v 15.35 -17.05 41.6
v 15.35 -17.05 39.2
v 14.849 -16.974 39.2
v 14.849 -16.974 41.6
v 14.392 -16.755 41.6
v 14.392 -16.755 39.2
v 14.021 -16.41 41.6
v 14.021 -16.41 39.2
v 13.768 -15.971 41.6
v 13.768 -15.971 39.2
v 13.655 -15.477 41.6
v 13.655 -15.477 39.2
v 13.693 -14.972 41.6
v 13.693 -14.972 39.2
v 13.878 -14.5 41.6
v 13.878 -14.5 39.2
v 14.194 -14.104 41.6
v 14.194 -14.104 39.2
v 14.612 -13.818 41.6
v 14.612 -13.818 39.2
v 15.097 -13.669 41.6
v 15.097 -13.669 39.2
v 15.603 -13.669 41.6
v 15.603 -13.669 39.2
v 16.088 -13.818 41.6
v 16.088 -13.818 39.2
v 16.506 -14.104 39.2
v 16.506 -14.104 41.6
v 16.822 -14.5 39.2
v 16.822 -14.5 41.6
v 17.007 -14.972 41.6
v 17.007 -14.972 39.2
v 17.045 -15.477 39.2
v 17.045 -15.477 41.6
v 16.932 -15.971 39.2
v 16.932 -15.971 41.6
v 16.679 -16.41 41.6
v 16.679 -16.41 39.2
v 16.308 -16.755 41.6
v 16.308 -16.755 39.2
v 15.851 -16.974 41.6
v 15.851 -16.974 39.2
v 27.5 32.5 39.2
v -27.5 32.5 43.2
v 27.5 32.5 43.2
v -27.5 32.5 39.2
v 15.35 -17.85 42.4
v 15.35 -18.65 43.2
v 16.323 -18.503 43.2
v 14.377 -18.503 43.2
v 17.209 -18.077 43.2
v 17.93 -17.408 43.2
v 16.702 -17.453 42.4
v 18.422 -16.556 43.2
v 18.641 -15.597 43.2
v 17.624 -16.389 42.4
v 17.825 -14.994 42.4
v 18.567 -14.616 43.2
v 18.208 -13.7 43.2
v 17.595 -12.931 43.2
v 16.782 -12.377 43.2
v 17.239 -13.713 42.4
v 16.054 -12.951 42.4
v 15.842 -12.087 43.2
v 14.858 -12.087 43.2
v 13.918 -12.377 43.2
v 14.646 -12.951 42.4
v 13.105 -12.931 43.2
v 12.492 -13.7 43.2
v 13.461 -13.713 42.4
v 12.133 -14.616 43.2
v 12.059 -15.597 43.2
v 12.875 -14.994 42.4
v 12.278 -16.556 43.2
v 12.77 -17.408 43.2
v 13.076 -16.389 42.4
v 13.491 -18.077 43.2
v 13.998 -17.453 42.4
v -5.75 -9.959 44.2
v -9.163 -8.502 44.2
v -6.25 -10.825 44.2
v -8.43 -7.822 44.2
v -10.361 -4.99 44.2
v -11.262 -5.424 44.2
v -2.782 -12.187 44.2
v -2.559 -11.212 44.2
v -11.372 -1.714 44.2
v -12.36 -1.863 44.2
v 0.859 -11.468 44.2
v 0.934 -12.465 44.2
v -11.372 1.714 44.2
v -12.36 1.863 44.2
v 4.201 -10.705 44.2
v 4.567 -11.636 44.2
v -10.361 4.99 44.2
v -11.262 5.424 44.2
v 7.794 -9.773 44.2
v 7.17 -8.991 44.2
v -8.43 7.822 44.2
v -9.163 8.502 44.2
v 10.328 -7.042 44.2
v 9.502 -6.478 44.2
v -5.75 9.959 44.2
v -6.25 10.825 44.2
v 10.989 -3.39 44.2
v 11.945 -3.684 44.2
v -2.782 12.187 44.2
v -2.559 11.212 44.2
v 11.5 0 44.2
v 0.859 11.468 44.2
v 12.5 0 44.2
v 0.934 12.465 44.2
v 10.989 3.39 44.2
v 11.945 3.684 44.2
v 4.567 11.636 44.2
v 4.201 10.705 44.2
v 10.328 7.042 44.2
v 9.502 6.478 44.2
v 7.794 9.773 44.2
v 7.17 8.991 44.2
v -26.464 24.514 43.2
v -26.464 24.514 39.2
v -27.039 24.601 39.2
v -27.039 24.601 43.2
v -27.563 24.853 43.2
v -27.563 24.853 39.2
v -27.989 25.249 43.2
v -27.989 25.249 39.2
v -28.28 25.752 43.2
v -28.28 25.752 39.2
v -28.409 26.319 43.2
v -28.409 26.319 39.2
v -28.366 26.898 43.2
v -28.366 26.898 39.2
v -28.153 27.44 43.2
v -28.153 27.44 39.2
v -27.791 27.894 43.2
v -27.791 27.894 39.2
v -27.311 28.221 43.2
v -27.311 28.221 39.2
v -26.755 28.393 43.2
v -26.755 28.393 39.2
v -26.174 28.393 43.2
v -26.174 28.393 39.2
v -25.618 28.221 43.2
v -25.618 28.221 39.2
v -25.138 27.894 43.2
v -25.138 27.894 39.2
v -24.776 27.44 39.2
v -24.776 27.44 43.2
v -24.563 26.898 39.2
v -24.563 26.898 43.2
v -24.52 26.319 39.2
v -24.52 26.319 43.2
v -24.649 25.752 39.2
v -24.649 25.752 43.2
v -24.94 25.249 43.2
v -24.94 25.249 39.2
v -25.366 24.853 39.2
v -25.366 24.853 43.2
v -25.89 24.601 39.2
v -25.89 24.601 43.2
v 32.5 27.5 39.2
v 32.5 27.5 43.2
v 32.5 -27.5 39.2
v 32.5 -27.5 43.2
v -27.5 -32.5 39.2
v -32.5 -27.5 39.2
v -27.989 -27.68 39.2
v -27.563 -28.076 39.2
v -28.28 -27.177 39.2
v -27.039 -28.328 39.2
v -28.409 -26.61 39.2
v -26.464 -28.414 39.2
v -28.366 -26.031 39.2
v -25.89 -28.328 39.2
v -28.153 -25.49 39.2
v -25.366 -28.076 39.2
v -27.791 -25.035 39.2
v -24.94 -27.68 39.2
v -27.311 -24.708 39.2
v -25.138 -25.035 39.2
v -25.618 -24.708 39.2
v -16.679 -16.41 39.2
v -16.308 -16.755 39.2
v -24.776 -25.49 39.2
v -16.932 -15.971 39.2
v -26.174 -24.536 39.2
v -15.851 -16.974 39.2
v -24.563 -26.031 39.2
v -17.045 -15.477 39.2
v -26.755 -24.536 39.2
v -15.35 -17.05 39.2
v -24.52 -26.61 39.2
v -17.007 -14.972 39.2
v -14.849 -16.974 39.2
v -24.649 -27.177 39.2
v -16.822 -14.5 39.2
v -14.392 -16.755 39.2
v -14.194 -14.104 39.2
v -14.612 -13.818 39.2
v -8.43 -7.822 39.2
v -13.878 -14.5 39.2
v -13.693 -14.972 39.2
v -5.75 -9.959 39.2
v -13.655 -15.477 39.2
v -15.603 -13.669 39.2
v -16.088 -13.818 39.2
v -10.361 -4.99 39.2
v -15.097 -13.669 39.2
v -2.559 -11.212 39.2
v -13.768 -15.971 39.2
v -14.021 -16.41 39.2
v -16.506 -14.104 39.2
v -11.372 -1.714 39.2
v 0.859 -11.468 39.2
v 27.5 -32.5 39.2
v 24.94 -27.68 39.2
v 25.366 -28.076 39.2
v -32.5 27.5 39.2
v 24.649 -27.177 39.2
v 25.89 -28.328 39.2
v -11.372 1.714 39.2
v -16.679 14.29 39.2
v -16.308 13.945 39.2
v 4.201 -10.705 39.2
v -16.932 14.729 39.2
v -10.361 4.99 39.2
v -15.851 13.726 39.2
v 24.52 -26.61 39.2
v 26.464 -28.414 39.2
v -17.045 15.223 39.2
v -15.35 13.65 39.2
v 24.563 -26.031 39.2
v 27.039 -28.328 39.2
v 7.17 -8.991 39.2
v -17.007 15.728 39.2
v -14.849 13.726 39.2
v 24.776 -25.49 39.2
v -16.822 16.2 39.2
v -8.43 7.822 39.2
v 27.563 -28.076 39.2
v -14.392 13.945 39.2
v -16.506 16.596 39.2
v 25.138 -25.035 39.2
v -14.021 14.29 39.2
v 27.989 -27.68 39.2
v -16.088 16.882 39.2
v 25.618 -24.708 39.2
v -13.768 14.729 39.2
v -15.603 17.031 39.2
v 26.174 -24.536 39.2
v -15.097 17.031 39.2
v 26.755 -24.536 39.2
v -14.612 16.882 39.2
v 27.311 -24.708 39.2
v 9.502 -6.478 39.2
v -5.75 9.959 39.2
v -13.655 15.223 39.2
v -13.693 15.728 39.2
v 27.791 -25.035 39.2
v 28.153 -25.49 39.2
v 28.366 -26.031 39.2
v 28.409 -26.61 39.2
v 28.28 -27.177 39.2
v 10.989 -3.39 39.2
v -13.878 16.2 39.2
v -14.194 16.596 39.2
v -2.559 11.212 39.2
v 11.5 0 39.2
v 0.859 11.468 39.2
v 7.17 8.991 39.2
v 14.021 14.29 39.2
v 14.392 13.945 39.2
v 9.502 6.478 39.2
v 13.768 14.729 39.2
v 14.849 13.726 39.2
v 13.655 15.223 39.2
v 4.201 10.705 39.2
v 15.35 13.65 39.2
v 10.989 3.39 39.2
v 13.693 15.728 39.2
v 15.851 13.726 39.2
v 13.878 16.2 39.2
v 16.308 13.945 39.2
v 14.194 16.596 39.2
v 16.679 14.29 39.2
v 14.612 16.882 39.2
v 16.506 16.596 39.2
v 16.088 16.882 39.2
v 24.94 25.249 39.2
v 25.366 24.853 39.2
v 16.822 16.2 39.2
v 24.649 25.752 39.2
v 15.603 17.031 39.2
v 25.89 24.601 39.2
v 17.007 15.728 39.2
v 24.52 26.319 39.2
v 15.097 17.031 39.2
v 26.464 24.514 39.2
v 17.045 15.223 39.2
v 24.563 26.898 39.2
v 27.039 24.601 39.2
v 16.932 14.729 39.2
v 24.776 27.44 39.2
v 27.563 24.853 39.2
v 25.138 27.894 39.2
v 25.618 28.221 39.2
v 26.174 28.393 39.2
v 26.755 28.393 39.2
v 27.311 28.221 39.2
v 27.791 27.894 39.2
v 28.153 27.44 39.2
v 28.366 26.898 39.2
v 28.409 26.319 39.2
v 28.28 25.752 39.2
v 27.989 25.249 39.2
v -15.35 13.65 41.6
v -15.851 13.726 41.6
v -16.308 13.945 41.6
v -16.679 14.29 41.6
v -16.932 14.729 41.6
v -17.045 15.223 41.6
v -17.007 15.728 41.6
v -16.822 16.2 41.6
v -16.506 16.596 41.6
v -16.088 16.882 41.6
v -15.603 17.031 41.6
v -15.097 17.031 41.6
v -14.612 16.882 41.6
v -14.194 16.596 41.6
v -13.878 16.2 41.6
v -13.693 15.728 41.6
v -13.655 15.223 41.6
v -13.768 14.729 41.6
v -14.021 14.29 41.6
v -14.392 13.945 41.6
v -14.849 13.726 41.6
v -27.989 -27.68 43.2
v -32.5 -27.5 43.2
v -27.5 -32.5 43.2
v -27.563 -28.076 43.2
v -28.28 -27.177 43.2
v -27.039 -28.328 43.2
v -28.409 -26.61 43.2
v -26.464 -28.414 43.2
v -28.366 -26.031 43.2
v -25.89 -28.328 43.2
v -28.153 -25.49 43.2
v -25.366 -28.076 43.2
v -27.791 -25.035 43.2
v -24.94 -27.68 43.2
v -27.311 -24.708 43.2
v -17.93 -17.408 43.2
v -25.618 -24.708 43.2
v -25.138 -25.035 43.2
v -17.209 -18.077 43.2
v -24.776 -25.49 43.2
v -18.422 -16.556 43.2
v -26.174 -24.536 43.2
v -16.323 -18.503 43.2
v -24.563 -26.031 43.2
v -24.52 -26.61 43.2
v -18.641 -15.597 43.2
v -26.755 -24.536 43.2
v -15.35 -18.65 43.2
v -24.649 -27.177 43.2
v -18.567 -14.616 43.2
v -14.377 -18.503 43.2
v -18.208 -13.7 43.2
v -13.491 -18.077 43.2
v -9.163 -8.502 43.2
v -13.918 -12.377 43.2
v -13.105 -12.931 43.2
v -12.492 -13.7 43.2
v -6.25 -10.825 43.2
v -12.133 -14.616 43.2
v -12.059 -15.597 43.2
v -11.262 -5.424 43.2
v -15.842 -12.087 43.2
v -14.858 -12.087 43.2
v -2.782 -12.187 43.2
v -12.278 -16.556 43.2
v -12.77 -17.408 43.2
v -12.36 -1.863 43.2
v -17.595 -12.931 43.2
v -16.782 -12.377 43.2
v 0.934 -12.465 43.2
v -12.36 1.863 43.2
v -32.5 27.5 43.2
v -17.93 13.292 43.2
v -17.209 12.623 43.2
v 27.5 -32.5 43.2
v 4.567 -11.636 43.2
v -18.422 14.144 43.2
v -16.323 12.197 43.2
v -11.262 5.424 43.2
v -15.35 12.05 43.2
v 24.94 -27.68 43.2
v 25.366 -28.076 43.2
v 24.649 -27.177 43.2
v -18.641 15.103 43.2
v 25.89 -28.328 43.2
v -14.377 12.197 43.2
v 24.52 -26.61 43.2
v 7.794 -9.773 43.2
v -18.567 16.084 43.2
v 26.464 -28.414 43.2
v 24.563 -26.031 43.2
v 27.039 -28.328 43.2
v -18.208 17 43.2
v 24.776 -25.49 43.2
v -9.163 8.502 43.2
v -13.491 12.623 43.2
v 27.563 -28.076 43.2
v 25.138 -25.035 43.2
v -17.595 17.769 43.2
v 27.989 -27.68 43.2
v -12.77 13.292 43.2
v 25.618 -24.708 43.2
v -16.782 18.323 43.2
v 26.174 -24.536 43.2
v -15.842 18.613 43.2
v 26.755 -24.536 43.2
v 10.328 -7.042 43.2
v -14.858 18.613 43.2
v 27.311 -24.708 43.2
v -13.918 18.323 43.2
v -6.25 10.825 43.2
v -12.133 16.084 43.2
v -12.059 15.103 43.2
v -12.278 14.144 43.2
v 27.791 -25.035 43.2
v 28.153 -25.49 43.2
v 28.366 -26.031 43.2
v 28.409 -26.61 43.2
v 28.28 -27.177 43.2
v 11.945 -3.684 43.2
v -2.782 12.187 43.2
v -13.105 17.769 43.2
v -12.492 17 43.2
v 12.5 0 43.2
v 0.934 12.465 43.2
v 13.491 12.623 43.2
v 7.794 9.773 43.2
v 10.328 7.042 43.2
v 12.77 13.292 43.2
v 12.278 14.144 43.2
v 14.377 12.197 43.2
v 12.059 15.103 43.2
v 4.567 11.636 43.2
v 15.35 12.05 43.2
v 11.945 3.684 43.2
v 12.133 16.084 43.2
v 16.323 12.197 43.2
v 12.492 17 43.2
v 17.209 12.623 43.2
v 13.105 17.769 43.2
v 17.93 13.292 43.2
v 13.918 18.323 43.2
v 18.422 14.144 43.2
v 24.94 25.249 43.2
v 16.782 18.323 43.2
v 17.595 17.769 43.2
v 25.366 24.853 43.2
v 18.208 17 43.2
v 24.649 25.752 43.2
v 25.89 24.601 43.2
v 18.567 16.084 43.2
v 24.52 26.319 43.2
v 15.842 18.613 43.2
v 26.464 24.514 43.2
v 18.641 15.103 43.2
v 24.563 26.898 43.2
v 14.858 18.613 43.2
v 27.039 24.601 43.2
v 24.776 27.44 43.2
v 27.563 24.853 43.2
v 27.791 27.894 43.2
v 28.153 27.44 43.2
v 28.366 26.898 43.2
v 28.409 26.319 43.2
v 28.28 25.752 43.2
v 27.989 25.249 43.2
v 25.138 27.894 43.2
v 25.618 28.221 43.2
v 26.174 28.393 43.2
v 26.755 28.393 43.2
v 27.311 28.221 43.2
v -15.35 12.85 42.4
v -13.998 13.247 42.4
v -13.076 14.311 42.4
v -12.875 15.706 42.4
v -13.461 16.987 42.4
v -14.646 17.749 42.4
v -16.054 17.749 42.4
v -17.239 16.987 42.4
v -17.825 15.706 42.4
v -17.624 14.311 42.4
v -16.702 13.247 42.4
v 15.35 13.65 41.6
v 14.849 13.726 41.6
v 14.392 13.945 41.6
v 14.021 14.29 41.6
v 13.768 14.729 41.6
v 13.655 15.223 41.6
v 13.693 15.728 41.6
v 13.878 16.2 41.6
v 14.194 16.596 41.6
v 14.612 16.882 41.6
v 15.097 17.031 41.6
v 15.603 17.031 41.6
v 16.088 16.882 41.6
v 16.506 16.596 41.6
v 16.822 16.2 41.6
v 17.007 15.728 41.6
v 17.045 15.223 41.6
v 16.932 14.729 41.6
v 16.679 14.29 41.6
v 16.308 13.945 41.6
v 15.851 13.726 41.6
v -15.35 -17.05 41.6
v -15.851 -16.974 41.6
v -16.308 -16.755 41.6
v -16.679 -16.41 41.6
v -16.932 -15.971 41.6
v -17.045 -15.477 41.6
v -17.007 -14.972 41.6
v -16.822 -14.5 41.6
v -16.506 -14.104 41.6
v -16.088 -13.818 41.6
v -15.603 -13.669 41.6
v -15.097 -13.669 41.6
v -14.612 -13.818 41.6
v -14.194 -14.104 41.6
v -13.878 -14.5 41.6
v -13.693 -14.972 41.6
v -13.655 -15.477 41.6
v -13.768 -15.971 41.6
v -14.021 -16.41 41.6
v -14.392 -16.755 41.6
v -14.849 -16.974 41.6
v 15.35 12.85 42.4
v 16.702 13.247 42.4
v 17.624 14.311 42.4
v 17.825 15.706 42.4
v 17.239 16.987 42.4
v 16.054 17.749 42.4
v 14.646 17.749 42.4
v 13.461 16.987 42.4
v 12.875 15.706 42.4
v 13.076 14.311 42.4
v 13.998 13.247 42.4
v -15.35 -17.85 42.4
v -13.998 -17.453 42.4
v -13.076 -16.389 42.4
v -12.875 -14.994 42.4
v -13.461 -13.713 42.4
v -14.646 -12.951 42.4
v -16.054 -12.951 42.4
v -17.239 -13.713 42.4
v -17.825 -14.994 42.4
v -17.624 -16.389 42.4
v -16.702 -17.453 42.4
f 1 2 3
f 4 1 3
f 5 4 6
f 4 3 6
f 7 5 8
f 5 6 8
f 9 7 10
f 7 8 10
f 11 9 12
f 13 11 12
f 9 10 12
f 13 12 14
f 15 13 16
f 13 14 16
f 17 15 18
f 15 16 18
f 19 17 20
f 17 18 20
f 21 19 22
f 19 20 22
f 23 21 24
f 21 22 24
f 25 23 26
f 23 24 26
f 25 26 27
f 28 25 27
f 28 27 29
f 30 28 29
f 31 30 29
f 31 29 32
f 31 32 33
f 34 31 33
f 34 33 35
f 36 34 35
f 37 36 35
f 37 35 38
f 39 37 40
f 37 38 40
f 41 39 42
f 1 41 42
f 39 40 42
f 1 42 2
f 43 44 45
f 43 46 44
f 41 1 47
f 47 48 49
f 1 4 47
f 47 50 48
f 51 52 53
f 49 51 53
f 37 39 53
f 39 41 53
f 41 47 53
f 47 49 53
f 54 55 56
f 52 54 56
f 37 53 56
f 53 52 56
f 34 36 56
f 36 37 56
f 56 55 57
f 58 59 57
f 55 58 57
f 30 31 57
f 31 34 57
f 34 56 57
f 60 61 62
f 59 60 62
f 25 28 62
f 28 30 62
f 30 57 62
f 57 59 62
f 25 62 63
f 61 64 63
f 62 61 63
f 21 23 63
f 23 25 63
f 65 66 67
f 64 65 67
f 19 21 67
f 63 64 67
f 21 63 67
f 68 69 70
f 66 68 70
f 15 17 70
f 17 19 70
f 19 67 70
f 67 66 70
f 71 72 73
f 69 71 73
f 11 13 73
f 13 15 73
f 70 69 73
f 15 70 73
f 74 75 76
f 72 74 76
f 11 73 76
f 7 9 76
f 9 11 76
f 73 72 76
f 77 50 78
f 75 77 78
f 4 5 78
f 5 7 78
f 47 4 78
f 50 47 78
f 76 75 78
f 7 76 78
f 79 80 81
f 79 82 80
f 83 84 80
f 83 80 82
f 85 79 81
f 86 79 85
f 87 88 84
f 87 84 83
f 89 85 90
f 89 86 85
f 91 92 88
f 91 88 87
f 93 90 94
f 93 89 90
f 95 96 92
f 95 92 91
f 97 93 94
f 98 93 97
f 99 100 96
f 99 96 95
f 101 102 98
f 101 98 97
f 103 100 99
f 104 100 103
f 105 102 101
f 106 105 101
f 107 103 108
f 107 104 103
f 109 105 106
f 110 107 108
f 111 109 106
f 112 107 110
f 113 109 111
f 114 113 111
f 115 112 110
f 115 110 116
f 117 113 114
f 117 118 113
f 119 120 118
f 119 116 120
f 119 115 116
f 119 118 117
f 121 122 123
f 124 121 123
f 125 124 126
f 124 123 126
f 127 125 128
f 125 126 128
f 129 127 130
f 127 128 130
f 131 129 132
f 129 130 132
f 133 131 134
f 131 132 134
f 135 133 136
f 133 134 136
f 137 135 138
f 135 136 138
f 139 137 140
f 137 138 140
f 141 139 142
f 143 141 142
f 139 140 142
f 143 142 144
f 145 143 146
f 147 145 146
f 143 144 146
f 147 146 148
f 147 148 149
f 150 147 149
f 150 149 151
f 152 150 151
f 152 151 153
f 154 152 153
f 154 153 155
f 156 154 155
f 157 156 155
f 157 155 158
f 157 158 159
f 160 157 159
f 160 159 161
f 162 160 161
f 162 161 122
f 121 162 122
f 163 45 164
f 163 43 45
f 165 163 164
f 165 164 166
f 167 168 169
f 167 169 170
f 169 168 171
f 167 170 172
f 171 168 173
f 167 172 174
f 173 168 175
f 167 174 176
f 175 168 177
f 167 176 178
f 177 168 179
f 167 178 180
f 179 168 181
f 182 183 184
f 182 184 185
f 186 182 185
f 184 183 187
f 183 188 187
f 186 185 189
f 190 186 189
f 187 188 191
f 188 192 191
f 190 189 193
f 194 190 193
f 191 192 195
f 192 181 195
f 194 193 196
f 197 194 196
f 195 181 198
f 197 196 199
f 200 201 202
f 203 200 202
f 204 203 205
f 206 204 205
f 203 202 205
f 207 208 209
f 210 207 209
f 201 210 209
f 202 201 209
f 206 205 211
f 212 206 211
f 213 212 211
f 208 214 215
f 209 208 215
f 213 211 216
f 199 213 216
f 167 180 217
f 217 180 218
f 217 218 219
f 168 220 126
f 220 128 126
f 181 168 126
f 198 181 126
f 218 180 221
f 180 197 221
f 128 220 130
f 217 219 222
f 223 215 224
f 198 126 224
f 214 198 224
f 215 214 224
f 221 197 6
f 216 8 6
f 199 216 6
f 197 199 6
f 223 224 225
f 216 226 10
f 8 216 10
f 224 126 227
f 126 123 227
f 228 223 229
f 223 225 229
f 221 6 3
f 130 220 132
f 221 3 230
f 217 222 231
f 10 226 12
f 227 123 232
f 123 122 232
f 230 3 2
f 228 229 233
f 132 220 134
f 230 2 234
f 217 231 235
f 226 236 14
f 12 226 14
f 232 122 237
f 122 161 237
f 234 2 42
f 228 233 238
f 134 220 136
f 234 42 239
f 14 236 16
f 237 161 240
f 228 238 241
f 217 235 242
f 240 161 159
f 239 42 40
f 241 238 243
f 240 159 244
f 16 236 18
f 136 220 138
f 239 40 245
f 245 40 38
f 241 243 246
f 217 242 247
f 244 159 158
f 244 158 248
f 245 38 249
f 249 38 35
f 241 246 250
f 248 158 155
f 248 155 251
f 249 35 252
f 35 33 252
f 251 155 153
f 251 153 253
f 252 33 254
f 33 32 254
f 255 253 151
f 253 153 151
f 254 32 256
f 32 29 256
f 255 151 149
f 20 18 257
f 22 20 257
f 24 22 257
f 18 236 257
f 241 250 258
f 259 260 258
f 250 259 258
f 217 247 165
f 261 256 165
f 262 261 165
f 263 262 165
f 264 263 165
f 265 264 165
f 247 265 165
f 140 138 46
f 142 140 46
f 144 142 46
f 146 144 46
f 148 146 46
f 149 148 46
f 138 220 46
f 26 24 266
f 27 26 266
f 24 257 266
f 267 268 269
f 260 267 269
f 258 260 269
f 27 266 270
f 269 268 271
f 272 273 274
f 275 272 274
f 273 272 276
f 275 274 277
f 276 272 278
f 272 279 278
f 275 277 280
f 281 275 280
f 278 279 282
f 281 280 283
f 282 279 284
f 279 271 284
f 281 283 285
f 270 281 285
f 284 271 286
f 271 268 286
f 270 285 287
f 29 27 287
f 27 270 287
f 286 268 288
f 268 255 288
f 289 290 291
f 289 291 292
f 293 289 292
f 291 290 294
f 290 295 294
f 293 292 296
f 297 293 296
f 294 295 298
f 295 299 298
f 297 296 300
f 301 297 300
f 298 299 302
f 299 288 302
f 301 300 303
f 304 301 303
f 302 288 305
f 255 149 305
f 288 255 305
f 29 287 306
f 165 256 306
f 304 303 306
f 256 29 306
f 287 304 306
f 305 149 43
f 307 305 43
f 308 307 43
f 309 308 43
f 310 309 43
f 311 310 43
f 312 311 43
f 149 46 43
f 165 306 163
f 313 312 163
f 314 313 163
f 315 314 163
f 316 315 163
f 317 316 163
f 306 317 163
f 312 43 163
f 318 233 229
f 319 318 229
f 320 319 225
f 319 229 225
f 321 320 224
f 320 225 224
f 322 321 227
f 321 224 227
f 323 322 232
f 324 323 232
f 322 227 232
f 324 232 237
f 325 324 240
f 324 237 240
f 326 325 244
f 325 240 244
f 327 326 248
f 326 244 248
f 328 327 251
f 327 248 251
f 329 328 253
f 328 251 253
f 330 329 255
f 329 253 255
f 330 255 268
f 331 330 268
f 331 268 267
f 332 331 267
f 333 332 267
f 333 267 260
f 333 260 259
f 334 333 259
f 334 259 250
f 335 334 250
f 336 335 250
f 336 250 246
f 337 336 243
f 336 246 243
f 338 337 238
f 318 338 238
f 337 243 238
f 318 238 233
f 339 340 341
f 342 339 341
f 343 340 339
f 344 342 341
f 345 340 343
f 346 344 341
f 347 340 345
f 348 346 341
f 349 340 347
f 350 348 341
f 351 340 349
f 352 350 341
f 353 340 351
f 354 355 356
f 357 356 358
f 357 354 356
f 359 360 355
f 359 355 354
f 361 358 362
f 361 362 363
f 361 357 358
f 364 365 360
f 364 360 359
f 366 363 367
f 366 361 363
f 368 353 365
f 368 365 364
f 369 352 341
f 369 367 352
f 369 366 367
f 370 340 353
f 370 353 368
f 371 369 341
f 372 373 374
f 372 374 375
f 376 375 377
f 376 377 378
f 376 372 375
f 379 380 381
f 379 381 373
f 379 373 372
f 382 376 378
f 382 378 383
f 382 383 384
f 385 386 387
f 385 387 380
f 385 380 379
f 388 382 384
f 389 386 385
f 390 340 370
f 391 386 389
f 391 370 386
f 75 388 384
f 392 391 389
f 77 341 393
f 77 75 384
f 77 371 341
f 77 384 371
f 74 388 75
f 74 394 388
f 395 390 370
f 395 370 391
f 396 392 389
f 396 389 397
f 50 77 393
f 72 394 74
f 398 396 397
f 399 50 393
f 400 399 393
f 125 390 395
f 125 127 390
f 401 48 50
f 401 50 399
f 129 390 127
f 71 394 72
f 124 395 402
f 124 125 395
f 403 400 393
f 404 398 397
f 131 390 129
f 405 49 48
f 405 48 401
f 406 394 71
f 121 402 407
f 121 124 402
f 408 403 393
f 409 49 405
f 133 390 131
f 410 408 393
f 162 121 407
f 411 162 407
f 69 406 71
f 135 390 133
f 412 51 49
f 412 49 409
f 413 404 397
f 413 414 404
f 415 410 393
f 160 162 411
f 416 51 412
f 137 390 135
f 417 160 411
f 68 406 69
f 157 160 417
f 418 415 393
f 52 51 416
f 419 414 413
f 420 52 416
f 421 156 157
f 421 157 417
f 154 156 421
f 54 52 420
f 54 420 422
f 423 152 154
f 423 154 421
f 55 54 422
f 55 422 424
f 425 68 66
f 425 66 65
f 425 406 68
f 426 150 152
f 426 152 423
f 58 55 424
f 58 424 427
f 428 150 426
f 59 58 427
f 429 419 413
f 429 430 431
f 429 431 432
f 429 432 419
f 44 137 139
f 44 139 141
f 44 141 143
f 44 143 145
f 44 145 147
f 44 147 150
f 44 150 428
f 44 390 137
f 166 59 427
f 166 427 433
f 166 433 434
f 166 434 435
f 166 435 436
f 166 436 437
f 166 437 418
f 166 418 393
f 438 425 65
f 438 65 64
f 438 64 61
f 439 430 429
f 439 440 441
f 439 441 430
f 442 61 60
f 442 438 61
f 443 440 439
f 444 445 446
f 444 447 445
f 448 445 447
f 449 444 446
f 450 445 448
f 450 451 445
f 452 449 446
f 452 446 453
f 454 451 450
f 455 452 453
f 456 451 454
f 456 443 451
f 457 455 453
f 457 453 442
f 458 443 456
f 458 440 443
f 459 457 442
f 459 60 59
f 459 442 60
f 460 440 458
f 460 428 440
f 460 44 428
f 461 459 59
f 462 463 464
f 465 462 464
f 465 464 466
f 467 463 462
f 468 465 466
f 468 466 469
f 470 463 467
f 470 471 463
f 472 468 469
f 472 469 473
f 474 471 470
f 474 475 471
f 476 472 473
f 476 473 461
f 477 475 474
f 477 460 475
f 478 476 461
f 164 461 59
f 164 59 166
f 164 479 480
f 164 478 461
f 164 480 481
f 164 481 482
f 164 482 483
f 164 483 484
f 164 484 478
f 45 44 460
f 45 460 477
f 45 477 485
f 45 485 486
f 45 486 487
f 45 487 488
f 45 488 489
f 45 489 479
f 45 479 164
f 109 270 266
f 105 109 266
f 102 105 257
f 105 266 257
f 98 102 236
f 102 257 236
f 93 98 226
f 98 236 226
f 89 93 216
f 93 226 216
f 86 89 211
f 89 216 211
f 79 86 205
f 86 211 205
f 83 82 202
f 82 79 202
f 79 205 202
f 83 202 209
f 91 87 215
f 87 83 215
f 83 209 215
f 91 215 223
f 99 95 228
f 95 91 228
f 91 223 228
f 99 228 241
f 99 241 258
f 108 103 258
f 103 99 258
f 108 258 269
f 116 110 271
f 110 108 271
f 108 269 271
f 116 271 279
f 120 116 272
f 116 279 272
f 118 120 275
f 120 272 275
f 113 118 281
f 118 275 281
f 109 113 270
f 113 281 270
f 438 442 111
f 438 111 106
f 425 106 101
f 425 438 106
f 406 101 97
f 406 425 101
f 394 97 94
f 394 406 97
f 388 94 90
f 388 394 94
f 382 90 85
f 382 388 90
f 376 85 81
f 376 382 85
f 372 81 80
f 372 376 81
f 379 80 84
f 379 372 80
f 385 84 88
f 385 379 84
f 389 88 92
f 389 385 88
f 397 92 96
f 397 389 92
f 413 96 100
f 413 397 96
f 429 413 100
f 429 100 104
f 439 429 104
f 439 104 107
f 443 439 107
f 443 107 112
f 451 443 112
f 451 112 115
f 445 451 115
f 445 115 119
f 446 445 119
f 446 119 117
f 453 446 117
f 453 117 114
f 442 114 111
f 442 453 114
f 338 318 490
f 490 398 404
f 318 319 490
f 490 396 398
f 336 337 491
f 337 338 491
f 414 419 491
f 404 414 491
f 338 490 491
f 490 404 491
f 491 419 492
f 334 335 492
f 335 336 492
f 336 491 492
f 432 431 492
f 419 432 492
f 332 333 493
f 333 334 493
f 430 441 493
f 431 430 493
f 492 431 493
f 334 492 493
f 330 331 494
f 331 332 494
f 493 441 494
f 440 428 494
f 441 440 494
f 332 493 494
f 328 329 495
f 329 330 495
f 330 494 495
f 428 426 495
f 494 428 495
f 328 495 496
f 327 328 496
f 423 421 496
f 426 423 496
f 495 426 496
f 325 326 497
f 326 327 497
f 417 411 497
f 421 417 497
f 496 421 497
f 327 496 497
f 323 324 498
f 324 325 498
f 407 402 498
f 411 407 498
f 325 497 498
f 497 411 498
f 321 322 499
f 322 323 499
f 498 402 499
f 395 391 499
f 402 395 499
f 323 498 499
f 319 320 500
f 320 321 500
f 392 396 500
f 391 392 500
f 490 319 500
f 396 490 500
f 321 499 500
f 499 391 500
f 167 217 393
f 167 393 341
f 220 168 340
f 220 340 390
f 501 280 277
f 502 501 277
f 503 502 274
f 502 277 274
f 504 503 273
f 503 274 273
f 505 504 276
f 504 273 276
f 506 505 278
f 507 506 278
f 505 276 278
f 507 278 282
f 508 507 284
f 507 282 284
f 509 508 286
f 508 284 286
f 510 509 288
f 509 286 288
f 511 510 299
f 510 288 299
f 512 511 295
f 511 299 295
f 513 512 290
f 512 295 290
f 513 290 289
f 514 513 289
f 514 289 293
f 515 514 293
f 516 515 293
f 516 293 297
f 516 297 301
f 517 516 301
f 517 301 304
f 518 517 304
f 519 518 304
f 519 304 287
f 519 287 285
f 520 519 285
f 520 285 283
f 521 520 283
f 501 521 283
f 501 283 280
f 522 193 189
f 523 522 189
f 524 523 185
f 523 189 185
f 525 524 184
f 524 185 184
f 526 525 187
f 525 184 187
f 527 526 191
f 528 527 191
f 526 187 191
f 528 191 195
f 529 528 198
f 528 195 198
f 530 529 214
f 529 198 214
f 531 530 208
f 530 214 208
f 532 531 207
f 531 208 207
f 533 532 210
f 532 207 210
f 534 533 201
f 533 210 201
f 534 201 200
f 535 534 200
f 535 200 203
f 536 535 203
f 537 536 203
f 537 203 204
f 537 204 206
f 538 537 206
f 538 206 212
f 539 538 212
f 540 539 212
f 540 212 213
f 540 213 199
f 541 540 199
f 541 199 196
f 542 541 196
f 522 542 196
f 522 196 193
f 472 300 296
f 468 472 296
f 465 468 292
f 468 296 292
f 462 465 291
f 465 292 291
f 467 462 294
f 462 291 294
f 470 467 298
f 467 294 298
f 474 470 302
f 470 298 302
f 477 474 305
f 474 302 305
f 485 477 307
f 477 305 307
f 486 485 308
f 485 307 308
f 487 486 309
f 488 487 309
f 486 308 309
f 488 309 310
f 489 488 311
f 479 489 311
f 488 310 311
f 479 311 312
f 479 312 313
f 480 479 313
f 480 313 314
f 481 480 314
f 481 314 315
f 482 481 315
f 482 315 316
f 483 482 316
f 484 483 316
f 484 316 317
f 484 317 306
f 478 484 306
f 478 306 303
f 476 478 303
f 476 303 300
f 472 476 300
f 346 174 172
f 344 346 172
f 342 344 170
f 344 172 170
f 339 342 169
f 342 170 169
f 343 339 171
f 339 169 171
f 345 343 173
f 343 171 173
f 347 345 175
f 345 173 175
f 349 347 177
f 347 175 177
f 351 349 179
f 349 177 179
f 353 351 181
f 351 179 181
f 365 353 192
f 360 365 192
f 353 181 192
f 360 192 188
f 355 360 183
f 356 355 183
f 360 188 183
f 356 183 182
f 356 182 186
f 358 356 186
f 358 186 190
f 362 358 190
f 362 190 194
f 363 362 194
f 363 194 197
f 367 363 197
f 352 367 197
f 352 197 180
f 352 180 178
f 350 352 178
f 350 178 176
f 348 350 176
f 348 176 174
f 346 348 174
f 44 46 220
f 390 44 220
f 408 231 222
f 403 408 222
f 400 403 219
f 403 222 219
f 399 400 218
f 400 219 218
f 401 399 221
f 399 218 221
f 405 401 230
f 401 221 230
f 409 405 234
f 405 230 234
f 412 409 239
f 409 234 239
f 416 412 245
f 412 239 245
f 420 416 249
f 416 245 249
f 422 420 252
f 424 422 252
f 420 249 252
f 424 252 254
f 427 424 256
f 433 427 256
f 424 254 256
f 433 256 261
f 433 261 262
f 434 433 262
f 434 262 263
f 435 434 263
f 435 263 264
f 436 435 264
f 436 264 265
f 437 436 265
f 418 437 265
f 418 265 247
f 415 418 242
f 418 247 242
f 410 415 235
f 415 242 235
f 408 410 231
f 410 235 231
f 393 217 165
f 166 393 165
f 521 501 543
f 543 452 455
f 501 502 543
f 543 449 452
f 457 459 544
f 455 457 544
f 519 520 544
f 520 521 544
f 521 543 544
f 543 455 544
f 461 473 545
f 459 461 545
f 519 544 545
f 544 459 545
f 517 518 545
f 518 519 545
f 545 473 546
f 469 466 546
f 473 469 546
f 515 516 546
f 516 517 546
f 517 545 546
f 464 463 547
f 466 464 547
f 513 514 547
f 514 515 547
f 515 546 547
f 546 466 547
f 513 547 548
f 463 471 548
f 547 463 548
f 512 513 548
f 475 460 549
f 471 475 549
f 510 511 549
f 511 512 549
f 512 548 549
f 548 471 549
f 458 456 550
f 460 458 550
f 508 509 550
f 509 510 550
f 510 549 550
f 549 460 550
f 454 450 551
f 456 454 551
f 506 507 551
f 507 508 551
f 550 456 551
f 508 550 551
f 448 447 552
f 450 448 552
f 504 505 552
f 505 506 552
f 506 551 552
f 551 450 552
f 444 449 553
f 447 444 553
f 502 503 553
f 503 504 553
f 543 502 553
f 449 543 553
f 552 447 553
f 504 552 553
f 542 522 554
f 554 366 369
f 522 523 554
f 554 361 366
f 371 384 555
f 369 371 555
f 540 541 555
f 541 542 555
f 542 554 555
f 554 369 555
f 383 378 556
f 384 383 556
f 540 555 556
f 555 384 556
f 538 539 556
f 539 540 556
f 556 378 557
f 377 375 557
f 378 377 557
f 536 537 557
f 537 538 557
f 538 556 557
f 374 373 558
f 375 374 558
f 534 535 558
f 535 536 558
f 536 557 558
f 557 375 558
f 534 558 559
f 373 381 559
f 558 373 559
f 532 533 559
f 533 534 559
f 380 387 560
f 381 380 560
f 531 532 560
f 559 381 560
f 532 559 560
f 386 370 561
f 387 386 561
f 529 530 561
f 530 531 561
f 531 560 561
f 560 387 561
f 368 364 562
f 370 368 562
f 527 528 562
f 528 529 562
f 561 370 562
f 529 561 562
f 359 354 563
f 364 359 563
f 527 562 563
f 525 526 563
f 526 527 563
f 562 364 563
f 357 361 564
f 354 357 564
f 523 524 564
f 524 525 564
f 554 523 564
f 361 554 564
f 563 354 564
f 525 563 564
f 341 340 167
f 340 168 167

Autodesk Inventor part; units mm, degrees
ref_plane "YZ Plane" through (0, 0, 0) normal (1, 0, 0) x (0, 1, 0)
ref_plane "XZ Plane" through (0, 0, 0) normal (0, 1, 0) x (-1, 0, 0)
ref_plane "РабПлоскость1" through (0, 0, 39.2) normal (0, 0, 1) x (1, 0, 0)
sketch "Эскиз1" plane through (0, 0, 39.2) normal (0, 0, 1) x (1, 0, 0)
  line L0 (27.5, -32.5) -> (-27.5, -32.5)
  line L1 (-32.5, -27.5) -> (-32.5, 27.5)
  line L2 (-27.5, 32.5) -> (27.5, 32.5)
  line L3 (32.5, 27.5) -> (32.5, -27.5)
  line L4 (32.5, -32.5) -> (-32.5, 32.5) construction
  line L5 (-32.5, -32.5) -> (32.5, 32.5) construction
  circle A0 centre (-15.35, 15.35) radius 1.75 construction
  circle A1 centre (15.35, 15.35) radius 1.75 construction
  arc A2 (14.0855, -15.35) -> (14.4559, -14.4559) centre (15.35, -15.35) ccw construction
  arc A3 (-16.6145, -15.35) -> (-16.2441, -14.4559) centre (-15.35, -15.35) ccw construction
  line L6 (-27.5, 32.5) -> (-32.5, 27.5)
  line L7 (-32.5, -27.5) -> (-27.5, -32.5)
  line L8 (27.5, -32.5) -> (32.5, -27.5)
  line L9 (27.5, 32.5) -> (32.5, 27.5)
  circle A4 centre (0, 0) radius 10.7 construction
  circle A5 centre (0, 0) radius 8.46 construction
  circle A6 centre (0, 0) radius 11.5
  dimension "d0" = 65
  dimension "d1" = 5
  dimension "d2" = 5
  dimension "d3" = 5
  dimension "d4" = 5
  dimension "d5" = 5
  dimension "d6" = 5
  dimension "d7" = 5
  dimension "d8" = 5
  dimension "d9" = 23
extrude "Выдавливание1" add sketch "Эскиз1" along normal blind 4
sketch "Эскиз2" plane through (0, 0, 43.2) normal (0, 0, 1) x (1, 0, 0)
  line L0 (15.35, -15.35) -> (-15.35, -15.35) construction
  line L1 (-15.35, -15.35) -> (-15.35, 15.35) construction
  line L2 (-15.35, 15.35) -> (15.35, 15.35) construction
  line L3 (15.35, 15.35) -> (15.35, -15.35) construction
  line L4 (15.35, -15.35) -> (-15.35, 15.35) construction
  line L5 (-15.35, -15.35) -> (15.35, 15.35) construction
  point P0 (0, 0)
  dimension "d12" = 30.7
hole "Отверстие1" at (-15.35, 15.35, 43.2) at (15.35, 15.35, 43.2) at (15.35, -15.35, 43.2) at (-15.35, -15.35, 43.2) direction (0, 0, -1) diameter 3.4 end through all countersink diameter 6.6 countersink angle 90 clearance for "с потайной головкой ГОСТ 12876-67" size "M3" standard "ГОСТ"
sketch "Эскиз3" plane through (0, 0, 43.2) normal (0, 0, 1) x (1, 0, 0)
  line L0 (26.4645, -26.4645) -> (-26.4645, -26.4645) construction
  line L1 (-26.4645, -26.4645) -> (-26.4645, 26.4645) construction
  line L2 (-26.4645, 26.4645) -> (26.4645, 26.4645) construction
  line L3 (26.4645, 26.4645) -> (26.4645, -26.4645) construction
  line L4 (26.4645, -26.4645) -> (-26.4645, 26.4645) construction
  line L5 (-26.4645, -26.4645) -> (26.4645, 26.4645) construction
  line L6 (-27.5, 32.5) -> (-32.5, 27.5) construction
  point P0 (0, 0)
  point P1 (-30, 30)
  dimension "d31" = 5
hole "Отверстие2" at (-26.4645, 26.4645, 43.2) at (26.4645, 26.4645, 43.2) at (26.4645, -26.4645, 43.2) at (-26.4645, -26.4645, 43.2) direction (0, 0, -1) diameter 3.9 end through all
sketch "Эскиз4" plane through (0, 0, 43.2) normal (0, 0, 1) x (1, 0, 0)
  circle A0 centre (0, 0) radius 12.5
  circle A1 centre (0, 0) radius 11.5 projected
  dimension "d28" = 1
extrude "Выдавливание2" add sketch "Эскиз4" along normal blind 1
equation "\"d2\" = d1"
equation "\"d3\" = d1"
equation "\"d4\" = d3"
equation "\"d5\" = d1"
equation "\"d6\" = d5"
equation "\"d7\" = d1"
equation "\"d8\" = d7"
properties part number "Основание_нижнее" material "По умолчанию1"
